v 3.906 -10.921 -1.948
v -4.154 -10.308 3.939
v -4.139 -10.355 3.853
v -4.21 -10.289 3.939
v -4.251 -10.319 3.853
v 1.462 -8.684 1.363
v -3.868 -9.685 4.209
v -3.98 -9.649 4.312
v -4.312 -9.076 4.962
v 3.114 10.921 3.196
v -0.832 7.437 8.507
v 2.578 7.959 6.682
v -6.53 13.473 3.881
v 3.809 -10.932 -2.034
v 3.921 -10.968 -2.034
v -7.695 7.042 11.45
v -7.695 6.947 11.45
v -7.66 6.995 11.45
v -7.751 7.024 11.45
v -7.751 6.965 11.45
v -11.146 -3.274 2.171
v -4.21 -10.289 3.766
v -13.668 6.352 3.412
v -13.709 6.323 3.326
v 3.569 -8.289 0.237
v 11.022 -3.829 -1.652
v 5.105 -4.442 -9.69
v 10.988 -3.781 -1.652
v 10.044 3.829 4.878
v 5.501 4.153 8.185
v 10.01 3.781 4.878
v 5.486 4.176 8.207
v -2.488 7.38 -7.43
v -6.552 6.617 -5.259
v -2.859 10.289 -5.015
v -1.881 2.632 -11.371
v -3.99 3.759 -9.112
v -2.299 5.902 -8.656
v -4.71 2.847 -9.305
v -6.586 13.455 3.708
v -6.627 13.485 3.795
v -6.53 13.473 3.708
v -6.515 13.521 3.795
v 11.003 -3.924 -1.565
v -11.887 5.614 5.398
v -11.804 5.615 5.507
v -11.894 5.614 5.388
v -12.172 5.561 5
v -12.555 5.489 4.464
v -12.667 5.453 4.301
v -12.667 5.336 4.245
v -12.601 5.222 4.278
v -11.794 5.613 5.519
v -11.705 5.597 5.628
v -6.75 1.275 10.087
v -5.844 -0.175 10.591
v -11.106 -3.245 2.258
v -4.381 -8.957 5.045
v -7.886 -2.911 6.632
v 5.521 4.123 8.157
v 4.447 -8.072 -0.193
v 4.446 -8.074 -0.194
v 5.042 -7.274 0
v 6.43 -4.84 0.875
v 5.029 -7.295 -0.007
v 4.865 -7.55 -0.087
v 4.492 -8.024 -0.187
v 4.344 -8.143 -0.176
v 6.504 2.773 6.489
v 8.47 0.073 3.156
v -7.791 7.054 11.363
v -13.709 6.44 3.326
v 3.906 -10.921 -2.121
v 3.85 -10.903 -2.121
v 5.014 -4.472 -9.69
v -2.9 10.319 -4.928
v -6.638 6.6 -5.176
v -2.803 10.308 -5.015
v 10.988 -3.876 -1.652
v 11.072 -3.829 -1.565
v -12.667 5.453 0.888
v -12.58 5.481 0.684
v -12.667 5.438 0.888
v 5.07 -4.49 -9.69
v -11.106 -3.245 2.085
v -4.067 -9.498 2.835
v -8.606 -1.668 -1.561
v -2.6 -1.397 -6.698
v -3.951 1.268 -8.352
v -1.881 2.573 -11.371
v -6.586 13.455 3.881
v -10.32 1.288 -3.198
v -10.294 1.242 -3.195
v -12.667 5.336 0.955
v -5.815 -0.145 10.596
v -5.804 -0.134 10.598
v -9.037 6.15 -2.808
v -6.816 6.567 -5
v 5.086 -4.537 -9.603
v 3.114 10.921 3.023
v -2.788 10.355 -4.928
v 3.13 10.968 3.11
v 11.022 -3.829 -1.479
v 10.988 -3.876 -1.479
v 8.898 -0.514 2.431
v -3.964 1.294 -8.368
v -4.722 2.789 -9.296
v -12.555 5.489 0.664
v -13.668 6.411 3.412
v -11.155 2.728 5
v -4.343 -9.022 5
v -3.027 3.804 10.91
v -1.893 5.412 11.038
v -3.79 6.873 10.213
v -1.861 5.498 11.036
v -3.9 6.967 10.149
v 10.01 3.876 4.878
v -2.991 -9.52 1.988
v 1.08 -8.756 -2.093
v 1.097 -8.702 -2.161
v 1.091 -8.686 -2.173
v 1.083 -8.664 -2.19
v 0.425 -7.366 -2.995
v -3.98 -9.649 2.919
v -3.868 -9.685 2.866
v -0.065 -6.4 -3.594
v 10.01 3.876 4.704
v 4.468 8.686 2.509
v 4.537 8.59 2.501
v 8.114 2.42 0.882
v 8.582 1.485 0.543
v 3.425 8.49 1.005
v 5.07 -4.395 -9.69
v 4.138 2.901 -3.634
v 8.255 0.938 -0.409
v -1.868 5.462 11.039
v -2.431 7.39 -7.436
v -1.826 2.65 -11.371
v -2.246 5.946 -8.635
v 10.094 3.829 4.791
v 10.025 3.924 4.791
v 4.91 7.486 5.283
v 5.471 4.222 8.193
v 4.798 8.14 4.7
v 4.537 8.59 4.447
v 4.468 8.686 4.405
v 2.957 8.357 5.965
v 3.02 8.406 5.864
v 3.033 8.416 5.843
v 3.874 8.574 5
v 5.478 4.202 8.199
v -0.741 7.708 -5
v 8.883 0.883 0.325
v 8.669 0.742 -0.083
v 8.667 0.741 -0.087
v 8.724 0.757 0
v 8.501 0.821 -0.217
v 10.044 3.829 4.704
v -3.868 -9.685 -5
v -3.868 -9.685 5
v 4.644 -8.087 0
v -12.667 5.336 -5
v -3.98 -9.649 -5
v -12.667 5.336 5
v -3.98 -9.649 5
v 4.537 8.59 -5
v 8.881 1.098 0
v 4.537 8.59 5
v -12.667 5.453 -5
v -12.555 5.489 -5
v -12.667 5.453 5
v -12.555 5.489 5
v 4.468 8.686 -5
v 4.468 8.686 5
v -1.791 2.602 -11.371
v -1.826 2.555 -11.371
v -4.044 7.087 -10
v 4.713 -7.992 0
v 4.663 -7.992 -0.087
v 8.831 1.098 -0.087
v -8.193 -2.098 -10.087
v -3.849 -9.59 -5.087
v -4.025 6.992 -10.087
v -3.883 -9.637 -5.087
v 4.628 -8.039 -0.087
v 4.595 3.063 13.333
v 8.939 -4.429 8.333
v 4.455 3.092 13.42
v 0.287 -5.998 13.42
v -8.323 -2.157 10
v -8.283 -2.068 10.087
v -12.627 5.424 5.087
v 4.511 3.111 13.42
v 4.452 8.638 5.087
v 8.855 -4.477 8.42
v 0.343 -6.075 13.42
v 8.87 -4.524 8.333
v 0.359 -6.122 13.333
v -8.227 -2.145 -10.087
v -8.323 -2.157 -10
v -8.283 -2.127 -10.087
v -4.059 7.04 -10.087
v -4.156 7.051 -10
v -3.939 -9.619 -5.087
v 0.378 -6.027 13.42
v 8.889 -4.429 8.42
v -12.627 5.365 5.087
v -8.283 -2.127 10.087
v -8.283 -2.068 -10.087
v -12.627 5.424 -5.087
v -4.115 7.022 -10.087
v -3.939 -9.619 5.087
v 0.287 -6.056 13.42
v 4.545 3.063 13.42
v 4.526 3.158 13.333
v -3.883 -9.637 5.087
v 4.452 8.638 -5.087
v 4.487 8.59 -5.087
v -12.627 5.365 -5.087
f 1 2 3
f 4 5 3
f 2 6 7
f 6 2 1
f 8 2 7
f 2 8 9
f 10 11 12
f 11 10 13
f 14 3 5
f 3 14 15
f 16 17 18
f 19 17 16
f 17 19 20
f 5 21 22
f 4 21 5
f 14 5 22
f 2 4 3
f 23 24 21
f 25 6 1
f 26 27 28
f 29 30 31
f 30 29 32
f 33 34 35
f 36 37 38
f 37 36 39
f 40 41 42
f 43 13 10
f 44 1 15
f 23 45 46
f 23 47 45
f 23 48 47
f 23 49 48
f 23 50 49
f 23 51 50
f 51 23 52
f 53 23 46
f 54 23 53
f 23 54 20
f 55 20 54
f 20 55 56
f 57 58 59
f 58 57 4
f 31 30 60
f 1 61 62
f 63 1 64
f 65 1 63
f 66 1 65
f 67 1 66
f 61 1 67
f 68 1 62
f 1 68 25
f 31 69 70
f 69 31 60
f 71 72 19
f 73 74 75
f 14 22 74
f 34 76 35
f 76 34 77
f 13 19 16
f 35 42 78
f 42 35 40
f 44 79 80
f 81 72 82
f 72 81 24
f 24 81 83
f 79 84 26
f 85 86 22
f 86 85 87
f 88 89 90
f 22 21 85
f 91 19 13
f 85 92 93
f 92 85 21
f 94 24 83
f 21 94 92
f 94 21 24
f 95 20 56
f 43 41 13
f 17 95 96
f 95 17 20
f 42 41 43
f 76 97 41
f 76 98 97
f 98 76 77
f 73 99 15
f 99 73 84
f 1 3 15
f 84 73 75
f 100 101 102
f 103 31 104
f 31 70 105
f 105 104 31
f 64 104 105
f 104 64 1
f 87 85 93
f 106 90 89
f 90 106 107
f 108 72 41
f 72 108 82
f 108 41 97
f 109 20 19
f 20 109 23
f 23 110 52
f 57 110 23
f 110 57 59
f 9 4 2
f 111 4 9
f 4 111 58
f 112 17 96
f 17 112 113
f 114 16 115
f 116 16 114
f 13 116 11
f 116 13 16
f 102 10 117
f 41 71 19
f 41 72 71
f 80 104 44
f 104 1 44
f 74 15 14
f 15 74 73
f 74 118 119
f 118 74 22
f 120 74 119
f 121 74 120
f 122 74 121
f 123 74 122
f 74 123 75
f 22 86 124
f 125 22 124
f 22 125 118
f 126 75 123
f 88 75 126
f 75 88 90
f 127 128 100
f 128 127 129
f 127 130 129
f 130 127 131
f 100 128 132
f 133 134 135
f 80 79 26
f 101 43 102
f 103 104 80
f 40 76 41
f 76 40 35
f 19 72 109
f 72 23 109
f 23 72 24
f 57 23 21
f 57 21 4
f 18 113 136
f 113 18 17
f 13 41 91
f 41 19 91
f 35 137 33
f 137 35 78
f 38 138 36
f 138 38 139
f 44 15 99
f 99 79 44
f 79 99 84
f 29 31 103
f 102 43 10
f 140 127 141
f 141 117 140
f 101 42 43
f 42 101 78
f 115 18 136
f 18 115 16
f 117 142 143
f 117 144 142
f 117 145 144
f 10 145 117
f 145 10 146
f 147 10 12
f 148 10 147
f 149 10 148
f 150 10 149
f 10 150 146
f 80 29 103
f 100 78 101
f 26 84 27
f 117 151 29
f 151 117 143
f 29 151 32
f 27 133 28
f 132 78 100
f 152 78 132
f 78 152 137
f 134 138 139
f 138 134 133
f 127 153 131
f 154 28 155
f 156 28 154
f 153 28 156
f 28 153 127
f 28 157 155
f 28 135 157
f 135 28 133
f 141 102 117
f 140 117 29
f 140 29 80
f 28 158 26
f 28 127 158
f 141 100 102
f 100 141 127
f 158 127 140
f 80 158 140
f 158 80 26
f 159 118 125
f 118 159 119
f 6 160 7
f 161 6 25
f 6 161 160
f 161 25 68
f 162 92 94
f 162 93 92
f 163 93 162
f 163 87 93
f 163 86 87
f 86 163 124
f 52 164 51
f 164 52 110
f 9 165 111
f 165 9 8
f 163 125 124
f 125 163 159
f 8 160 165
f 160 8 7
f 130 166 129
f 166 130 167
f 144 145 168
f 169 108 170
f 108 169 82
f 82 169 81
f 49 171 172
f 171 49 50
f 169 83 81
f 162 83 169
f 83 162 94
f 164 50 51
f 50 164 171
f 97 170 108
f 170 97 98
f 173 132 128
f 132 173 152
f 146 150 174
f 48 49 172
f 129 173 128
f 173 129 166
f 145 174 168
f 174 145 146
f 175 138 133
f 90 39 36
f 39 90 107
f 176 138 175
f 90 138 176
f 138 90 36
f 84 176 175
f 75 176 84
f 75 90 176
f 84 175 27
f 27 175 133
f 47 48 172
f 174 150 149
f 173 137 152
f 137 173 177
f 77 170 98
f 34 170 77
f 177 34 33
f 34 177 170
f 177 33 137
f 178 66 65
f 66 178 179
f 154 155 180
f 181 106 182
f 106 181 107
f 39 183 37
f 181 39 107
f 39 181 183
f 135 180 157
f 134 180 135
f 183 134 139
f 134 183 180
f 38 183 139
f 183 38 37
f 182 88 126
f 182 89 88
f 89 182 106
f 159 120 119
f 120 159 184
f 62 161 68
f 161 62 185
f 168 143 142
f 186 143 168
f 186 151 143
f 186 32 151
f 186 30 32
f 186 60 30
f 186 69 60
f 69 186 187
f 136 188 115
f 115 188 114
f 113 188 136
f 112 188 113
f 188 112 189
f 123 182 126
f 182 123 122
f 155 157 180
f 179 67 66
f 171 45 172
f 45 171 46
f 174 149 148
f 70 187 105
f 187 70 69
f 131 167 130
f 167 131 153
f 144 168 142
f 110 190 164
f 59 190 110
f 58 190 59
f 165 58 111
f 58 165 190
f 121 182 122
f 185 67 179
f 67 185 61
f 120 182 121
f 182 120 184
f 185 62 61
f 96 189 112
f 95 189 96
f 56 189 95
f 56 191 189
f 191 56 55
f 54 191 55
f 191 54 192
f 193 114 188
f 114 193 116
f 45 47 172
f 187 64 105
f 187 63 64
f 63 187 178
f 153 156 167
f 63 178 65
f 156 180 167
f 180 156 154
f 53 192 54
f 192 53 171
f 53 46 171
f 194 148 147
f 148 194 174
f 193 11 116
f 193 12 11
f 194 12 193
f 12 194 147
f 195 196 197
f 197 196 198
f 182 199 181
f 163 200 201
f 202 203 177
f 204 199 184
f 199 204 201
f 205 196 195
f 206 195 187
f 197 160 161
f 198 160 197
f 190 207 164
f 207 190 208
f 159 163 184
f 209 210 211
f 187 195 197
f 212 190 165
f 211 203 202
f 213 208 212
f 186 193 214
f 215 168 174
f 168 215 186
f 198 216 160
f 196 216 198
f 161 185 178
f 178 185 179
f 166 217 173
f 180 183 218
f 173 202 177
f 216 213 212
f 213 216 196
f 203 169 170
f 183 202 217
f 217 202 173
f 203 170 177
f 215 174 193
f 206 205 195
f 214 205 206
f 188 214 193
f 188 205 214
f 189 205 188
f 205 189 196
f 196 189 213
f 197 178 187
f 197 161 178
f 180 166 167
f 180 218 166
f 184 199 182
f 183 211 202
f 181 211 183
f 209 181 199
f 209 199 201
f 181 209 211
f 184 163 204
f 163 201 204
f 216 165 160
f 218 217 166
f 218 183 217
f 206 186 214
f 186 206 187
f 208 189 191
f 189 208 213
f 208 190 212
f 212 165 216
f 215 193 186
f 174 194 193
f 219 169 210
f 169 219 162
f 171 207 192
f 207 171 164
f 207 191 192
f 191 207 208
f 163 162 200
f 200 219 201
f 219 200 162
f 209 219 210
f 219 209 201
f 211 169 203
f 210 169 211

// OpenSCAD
// Auto-generated OpenSCAD file

    inner_points = 10*[[-0.4074818991364223, 0.6992365292821007, 1.0000000000000828], [-0.3898663328584005, -0.9589823018207535, -0.5000000000001132], [0.44367143495763933, 0.8590426676513406, 0.5000000000000088], [-0.8242507830446055, -0.20977595545377065, -0.9999999999999784], [-0.8242507830443877, -0.20977595545400485, 1.0000000000000218], [-0.38986633285829164, -0.9589823018208707, 0.4999999999998866], [0.44367143495753053, 0.8590426676514578, -0.4999999999999911], [-0.4074818991366401, 0.6992365292823348, -0.9999999999999172], [-1.2586352332305926, 0.5394303909129777, 0.5000000000001568], [0.46128700123576977, -0.7991761634516306, -1.8726686867864828e-13], [0.8780558851437354, 0.10983632128447508, -1.2620460232426467e-13], [-1.2586352332307016, 0.539430390913095, -0.49999999999984335], [0.44954329038379176, 0.3063030572835663, 1.3333333333332769], [0.032774406475826245, -0.6027094274525393, 1.3333333333332158], [0.883927740569888, -0.44290328908329923, 0.8333333333331419]];

    outer_points = 10*[[-0.2818912922299794, 1.0259982195154702, -0.49281330432121767], [-0.4169920179568701, -1.0259982195154702, 0.38528601131022405], [0.30986993589944156, 1.0873280397967147, 0.31096359384582334], [0.3890133742874079, -1.0873280397967147, -0.20343630083482972], [-0.990100816973316, 0.3215561330780754, -0.5397240271737466], [-1.1065491135872318, -0.3215561330780754, 0.21714214814076563], [0.9994270315298034, 0.38288595335931963, 0.4791074570152818], [1.0972228990307444, -0.38288595335931963, -0.1565255779823009], [-0.18409542472903828, 0.2602263127968311, -1.1284463393188005], [-0.5147878854578112, -0.2602263127968311, 1.0209190463078066], [0.1934216392855257, 0.4442157736405639, 1.0678297691603356], [0.5054616709013238, -0.4442157736405639, -0.9603024761493418], [-0.654573100183338, 1.342585342036261, 0.3794715481636927], [-1.3627826249266748, 0.6381432555988661, 0.33256082531116393], [-0.7710213967972539, 0.6994730758801104, 1.1363377234782046]];

    // Convex hull for inner set (I)
    module inner_hull() {
        hull() {
            for (p = inner_points) {
                translate(p) sphere(r=0.1);
            }
        }
    }

    // Convex hull for outer set (O) minus inner hull (O \ I)
    module outer_minus_inner() {
        difference() {
            hull() {
                for (p = outer_points) {
                    translate(p) sphere(r=0.1);
                }
            }
            inner_hull(); // Subtract inner hull
        }
    }

    // Convex hull for outer set (O) minus all translated inner hulls
    module outer_minus_AllTranslationInner() {
        difference() {
            hull() {
                for (p = outer_points) {
                    translate(p) sphere(r=0.1);
                }
            }
            hull() {
                translate([0,0,50]) inner_hull();
                translate([0,0,-50]) inner_hull();
            }; // Subtract translated inner hulls
        }
    }

    // Difference between outer_minus_inner and outer_minus_AllTranslationInner
    module outer_minus_inner_diff() {
        difference() {
            // Outer minus inner
            difference() {
                hull() {
                    for (p = outer_points) {
                        translate(p) sphere(r=0.1);
                    }
                }
                inner_hull();
            }

            // Subtract Outer minus AllTranslationInner
            difference() {
                hull() {
                    for (p = outer_points) {
                        translate(p) sphere(r=0.1);
                    }
                }
                hull() {
                    translate([0,0,50]) inner_hull();
                    translate([0,0,-50]) inner_hull();
                };
            }
        }
    }

    // Rendering all with colors applied
    color([1, 0, 0, 0.5]) inner_hull(); // Transparent red
    color([0, 1, 0, 1]) outer_minus_AllTranslationInner(); // Opaque green
    color([1, 1, 0, 1]) outer_minus_inner_diff(); // Opaque yellow
    
